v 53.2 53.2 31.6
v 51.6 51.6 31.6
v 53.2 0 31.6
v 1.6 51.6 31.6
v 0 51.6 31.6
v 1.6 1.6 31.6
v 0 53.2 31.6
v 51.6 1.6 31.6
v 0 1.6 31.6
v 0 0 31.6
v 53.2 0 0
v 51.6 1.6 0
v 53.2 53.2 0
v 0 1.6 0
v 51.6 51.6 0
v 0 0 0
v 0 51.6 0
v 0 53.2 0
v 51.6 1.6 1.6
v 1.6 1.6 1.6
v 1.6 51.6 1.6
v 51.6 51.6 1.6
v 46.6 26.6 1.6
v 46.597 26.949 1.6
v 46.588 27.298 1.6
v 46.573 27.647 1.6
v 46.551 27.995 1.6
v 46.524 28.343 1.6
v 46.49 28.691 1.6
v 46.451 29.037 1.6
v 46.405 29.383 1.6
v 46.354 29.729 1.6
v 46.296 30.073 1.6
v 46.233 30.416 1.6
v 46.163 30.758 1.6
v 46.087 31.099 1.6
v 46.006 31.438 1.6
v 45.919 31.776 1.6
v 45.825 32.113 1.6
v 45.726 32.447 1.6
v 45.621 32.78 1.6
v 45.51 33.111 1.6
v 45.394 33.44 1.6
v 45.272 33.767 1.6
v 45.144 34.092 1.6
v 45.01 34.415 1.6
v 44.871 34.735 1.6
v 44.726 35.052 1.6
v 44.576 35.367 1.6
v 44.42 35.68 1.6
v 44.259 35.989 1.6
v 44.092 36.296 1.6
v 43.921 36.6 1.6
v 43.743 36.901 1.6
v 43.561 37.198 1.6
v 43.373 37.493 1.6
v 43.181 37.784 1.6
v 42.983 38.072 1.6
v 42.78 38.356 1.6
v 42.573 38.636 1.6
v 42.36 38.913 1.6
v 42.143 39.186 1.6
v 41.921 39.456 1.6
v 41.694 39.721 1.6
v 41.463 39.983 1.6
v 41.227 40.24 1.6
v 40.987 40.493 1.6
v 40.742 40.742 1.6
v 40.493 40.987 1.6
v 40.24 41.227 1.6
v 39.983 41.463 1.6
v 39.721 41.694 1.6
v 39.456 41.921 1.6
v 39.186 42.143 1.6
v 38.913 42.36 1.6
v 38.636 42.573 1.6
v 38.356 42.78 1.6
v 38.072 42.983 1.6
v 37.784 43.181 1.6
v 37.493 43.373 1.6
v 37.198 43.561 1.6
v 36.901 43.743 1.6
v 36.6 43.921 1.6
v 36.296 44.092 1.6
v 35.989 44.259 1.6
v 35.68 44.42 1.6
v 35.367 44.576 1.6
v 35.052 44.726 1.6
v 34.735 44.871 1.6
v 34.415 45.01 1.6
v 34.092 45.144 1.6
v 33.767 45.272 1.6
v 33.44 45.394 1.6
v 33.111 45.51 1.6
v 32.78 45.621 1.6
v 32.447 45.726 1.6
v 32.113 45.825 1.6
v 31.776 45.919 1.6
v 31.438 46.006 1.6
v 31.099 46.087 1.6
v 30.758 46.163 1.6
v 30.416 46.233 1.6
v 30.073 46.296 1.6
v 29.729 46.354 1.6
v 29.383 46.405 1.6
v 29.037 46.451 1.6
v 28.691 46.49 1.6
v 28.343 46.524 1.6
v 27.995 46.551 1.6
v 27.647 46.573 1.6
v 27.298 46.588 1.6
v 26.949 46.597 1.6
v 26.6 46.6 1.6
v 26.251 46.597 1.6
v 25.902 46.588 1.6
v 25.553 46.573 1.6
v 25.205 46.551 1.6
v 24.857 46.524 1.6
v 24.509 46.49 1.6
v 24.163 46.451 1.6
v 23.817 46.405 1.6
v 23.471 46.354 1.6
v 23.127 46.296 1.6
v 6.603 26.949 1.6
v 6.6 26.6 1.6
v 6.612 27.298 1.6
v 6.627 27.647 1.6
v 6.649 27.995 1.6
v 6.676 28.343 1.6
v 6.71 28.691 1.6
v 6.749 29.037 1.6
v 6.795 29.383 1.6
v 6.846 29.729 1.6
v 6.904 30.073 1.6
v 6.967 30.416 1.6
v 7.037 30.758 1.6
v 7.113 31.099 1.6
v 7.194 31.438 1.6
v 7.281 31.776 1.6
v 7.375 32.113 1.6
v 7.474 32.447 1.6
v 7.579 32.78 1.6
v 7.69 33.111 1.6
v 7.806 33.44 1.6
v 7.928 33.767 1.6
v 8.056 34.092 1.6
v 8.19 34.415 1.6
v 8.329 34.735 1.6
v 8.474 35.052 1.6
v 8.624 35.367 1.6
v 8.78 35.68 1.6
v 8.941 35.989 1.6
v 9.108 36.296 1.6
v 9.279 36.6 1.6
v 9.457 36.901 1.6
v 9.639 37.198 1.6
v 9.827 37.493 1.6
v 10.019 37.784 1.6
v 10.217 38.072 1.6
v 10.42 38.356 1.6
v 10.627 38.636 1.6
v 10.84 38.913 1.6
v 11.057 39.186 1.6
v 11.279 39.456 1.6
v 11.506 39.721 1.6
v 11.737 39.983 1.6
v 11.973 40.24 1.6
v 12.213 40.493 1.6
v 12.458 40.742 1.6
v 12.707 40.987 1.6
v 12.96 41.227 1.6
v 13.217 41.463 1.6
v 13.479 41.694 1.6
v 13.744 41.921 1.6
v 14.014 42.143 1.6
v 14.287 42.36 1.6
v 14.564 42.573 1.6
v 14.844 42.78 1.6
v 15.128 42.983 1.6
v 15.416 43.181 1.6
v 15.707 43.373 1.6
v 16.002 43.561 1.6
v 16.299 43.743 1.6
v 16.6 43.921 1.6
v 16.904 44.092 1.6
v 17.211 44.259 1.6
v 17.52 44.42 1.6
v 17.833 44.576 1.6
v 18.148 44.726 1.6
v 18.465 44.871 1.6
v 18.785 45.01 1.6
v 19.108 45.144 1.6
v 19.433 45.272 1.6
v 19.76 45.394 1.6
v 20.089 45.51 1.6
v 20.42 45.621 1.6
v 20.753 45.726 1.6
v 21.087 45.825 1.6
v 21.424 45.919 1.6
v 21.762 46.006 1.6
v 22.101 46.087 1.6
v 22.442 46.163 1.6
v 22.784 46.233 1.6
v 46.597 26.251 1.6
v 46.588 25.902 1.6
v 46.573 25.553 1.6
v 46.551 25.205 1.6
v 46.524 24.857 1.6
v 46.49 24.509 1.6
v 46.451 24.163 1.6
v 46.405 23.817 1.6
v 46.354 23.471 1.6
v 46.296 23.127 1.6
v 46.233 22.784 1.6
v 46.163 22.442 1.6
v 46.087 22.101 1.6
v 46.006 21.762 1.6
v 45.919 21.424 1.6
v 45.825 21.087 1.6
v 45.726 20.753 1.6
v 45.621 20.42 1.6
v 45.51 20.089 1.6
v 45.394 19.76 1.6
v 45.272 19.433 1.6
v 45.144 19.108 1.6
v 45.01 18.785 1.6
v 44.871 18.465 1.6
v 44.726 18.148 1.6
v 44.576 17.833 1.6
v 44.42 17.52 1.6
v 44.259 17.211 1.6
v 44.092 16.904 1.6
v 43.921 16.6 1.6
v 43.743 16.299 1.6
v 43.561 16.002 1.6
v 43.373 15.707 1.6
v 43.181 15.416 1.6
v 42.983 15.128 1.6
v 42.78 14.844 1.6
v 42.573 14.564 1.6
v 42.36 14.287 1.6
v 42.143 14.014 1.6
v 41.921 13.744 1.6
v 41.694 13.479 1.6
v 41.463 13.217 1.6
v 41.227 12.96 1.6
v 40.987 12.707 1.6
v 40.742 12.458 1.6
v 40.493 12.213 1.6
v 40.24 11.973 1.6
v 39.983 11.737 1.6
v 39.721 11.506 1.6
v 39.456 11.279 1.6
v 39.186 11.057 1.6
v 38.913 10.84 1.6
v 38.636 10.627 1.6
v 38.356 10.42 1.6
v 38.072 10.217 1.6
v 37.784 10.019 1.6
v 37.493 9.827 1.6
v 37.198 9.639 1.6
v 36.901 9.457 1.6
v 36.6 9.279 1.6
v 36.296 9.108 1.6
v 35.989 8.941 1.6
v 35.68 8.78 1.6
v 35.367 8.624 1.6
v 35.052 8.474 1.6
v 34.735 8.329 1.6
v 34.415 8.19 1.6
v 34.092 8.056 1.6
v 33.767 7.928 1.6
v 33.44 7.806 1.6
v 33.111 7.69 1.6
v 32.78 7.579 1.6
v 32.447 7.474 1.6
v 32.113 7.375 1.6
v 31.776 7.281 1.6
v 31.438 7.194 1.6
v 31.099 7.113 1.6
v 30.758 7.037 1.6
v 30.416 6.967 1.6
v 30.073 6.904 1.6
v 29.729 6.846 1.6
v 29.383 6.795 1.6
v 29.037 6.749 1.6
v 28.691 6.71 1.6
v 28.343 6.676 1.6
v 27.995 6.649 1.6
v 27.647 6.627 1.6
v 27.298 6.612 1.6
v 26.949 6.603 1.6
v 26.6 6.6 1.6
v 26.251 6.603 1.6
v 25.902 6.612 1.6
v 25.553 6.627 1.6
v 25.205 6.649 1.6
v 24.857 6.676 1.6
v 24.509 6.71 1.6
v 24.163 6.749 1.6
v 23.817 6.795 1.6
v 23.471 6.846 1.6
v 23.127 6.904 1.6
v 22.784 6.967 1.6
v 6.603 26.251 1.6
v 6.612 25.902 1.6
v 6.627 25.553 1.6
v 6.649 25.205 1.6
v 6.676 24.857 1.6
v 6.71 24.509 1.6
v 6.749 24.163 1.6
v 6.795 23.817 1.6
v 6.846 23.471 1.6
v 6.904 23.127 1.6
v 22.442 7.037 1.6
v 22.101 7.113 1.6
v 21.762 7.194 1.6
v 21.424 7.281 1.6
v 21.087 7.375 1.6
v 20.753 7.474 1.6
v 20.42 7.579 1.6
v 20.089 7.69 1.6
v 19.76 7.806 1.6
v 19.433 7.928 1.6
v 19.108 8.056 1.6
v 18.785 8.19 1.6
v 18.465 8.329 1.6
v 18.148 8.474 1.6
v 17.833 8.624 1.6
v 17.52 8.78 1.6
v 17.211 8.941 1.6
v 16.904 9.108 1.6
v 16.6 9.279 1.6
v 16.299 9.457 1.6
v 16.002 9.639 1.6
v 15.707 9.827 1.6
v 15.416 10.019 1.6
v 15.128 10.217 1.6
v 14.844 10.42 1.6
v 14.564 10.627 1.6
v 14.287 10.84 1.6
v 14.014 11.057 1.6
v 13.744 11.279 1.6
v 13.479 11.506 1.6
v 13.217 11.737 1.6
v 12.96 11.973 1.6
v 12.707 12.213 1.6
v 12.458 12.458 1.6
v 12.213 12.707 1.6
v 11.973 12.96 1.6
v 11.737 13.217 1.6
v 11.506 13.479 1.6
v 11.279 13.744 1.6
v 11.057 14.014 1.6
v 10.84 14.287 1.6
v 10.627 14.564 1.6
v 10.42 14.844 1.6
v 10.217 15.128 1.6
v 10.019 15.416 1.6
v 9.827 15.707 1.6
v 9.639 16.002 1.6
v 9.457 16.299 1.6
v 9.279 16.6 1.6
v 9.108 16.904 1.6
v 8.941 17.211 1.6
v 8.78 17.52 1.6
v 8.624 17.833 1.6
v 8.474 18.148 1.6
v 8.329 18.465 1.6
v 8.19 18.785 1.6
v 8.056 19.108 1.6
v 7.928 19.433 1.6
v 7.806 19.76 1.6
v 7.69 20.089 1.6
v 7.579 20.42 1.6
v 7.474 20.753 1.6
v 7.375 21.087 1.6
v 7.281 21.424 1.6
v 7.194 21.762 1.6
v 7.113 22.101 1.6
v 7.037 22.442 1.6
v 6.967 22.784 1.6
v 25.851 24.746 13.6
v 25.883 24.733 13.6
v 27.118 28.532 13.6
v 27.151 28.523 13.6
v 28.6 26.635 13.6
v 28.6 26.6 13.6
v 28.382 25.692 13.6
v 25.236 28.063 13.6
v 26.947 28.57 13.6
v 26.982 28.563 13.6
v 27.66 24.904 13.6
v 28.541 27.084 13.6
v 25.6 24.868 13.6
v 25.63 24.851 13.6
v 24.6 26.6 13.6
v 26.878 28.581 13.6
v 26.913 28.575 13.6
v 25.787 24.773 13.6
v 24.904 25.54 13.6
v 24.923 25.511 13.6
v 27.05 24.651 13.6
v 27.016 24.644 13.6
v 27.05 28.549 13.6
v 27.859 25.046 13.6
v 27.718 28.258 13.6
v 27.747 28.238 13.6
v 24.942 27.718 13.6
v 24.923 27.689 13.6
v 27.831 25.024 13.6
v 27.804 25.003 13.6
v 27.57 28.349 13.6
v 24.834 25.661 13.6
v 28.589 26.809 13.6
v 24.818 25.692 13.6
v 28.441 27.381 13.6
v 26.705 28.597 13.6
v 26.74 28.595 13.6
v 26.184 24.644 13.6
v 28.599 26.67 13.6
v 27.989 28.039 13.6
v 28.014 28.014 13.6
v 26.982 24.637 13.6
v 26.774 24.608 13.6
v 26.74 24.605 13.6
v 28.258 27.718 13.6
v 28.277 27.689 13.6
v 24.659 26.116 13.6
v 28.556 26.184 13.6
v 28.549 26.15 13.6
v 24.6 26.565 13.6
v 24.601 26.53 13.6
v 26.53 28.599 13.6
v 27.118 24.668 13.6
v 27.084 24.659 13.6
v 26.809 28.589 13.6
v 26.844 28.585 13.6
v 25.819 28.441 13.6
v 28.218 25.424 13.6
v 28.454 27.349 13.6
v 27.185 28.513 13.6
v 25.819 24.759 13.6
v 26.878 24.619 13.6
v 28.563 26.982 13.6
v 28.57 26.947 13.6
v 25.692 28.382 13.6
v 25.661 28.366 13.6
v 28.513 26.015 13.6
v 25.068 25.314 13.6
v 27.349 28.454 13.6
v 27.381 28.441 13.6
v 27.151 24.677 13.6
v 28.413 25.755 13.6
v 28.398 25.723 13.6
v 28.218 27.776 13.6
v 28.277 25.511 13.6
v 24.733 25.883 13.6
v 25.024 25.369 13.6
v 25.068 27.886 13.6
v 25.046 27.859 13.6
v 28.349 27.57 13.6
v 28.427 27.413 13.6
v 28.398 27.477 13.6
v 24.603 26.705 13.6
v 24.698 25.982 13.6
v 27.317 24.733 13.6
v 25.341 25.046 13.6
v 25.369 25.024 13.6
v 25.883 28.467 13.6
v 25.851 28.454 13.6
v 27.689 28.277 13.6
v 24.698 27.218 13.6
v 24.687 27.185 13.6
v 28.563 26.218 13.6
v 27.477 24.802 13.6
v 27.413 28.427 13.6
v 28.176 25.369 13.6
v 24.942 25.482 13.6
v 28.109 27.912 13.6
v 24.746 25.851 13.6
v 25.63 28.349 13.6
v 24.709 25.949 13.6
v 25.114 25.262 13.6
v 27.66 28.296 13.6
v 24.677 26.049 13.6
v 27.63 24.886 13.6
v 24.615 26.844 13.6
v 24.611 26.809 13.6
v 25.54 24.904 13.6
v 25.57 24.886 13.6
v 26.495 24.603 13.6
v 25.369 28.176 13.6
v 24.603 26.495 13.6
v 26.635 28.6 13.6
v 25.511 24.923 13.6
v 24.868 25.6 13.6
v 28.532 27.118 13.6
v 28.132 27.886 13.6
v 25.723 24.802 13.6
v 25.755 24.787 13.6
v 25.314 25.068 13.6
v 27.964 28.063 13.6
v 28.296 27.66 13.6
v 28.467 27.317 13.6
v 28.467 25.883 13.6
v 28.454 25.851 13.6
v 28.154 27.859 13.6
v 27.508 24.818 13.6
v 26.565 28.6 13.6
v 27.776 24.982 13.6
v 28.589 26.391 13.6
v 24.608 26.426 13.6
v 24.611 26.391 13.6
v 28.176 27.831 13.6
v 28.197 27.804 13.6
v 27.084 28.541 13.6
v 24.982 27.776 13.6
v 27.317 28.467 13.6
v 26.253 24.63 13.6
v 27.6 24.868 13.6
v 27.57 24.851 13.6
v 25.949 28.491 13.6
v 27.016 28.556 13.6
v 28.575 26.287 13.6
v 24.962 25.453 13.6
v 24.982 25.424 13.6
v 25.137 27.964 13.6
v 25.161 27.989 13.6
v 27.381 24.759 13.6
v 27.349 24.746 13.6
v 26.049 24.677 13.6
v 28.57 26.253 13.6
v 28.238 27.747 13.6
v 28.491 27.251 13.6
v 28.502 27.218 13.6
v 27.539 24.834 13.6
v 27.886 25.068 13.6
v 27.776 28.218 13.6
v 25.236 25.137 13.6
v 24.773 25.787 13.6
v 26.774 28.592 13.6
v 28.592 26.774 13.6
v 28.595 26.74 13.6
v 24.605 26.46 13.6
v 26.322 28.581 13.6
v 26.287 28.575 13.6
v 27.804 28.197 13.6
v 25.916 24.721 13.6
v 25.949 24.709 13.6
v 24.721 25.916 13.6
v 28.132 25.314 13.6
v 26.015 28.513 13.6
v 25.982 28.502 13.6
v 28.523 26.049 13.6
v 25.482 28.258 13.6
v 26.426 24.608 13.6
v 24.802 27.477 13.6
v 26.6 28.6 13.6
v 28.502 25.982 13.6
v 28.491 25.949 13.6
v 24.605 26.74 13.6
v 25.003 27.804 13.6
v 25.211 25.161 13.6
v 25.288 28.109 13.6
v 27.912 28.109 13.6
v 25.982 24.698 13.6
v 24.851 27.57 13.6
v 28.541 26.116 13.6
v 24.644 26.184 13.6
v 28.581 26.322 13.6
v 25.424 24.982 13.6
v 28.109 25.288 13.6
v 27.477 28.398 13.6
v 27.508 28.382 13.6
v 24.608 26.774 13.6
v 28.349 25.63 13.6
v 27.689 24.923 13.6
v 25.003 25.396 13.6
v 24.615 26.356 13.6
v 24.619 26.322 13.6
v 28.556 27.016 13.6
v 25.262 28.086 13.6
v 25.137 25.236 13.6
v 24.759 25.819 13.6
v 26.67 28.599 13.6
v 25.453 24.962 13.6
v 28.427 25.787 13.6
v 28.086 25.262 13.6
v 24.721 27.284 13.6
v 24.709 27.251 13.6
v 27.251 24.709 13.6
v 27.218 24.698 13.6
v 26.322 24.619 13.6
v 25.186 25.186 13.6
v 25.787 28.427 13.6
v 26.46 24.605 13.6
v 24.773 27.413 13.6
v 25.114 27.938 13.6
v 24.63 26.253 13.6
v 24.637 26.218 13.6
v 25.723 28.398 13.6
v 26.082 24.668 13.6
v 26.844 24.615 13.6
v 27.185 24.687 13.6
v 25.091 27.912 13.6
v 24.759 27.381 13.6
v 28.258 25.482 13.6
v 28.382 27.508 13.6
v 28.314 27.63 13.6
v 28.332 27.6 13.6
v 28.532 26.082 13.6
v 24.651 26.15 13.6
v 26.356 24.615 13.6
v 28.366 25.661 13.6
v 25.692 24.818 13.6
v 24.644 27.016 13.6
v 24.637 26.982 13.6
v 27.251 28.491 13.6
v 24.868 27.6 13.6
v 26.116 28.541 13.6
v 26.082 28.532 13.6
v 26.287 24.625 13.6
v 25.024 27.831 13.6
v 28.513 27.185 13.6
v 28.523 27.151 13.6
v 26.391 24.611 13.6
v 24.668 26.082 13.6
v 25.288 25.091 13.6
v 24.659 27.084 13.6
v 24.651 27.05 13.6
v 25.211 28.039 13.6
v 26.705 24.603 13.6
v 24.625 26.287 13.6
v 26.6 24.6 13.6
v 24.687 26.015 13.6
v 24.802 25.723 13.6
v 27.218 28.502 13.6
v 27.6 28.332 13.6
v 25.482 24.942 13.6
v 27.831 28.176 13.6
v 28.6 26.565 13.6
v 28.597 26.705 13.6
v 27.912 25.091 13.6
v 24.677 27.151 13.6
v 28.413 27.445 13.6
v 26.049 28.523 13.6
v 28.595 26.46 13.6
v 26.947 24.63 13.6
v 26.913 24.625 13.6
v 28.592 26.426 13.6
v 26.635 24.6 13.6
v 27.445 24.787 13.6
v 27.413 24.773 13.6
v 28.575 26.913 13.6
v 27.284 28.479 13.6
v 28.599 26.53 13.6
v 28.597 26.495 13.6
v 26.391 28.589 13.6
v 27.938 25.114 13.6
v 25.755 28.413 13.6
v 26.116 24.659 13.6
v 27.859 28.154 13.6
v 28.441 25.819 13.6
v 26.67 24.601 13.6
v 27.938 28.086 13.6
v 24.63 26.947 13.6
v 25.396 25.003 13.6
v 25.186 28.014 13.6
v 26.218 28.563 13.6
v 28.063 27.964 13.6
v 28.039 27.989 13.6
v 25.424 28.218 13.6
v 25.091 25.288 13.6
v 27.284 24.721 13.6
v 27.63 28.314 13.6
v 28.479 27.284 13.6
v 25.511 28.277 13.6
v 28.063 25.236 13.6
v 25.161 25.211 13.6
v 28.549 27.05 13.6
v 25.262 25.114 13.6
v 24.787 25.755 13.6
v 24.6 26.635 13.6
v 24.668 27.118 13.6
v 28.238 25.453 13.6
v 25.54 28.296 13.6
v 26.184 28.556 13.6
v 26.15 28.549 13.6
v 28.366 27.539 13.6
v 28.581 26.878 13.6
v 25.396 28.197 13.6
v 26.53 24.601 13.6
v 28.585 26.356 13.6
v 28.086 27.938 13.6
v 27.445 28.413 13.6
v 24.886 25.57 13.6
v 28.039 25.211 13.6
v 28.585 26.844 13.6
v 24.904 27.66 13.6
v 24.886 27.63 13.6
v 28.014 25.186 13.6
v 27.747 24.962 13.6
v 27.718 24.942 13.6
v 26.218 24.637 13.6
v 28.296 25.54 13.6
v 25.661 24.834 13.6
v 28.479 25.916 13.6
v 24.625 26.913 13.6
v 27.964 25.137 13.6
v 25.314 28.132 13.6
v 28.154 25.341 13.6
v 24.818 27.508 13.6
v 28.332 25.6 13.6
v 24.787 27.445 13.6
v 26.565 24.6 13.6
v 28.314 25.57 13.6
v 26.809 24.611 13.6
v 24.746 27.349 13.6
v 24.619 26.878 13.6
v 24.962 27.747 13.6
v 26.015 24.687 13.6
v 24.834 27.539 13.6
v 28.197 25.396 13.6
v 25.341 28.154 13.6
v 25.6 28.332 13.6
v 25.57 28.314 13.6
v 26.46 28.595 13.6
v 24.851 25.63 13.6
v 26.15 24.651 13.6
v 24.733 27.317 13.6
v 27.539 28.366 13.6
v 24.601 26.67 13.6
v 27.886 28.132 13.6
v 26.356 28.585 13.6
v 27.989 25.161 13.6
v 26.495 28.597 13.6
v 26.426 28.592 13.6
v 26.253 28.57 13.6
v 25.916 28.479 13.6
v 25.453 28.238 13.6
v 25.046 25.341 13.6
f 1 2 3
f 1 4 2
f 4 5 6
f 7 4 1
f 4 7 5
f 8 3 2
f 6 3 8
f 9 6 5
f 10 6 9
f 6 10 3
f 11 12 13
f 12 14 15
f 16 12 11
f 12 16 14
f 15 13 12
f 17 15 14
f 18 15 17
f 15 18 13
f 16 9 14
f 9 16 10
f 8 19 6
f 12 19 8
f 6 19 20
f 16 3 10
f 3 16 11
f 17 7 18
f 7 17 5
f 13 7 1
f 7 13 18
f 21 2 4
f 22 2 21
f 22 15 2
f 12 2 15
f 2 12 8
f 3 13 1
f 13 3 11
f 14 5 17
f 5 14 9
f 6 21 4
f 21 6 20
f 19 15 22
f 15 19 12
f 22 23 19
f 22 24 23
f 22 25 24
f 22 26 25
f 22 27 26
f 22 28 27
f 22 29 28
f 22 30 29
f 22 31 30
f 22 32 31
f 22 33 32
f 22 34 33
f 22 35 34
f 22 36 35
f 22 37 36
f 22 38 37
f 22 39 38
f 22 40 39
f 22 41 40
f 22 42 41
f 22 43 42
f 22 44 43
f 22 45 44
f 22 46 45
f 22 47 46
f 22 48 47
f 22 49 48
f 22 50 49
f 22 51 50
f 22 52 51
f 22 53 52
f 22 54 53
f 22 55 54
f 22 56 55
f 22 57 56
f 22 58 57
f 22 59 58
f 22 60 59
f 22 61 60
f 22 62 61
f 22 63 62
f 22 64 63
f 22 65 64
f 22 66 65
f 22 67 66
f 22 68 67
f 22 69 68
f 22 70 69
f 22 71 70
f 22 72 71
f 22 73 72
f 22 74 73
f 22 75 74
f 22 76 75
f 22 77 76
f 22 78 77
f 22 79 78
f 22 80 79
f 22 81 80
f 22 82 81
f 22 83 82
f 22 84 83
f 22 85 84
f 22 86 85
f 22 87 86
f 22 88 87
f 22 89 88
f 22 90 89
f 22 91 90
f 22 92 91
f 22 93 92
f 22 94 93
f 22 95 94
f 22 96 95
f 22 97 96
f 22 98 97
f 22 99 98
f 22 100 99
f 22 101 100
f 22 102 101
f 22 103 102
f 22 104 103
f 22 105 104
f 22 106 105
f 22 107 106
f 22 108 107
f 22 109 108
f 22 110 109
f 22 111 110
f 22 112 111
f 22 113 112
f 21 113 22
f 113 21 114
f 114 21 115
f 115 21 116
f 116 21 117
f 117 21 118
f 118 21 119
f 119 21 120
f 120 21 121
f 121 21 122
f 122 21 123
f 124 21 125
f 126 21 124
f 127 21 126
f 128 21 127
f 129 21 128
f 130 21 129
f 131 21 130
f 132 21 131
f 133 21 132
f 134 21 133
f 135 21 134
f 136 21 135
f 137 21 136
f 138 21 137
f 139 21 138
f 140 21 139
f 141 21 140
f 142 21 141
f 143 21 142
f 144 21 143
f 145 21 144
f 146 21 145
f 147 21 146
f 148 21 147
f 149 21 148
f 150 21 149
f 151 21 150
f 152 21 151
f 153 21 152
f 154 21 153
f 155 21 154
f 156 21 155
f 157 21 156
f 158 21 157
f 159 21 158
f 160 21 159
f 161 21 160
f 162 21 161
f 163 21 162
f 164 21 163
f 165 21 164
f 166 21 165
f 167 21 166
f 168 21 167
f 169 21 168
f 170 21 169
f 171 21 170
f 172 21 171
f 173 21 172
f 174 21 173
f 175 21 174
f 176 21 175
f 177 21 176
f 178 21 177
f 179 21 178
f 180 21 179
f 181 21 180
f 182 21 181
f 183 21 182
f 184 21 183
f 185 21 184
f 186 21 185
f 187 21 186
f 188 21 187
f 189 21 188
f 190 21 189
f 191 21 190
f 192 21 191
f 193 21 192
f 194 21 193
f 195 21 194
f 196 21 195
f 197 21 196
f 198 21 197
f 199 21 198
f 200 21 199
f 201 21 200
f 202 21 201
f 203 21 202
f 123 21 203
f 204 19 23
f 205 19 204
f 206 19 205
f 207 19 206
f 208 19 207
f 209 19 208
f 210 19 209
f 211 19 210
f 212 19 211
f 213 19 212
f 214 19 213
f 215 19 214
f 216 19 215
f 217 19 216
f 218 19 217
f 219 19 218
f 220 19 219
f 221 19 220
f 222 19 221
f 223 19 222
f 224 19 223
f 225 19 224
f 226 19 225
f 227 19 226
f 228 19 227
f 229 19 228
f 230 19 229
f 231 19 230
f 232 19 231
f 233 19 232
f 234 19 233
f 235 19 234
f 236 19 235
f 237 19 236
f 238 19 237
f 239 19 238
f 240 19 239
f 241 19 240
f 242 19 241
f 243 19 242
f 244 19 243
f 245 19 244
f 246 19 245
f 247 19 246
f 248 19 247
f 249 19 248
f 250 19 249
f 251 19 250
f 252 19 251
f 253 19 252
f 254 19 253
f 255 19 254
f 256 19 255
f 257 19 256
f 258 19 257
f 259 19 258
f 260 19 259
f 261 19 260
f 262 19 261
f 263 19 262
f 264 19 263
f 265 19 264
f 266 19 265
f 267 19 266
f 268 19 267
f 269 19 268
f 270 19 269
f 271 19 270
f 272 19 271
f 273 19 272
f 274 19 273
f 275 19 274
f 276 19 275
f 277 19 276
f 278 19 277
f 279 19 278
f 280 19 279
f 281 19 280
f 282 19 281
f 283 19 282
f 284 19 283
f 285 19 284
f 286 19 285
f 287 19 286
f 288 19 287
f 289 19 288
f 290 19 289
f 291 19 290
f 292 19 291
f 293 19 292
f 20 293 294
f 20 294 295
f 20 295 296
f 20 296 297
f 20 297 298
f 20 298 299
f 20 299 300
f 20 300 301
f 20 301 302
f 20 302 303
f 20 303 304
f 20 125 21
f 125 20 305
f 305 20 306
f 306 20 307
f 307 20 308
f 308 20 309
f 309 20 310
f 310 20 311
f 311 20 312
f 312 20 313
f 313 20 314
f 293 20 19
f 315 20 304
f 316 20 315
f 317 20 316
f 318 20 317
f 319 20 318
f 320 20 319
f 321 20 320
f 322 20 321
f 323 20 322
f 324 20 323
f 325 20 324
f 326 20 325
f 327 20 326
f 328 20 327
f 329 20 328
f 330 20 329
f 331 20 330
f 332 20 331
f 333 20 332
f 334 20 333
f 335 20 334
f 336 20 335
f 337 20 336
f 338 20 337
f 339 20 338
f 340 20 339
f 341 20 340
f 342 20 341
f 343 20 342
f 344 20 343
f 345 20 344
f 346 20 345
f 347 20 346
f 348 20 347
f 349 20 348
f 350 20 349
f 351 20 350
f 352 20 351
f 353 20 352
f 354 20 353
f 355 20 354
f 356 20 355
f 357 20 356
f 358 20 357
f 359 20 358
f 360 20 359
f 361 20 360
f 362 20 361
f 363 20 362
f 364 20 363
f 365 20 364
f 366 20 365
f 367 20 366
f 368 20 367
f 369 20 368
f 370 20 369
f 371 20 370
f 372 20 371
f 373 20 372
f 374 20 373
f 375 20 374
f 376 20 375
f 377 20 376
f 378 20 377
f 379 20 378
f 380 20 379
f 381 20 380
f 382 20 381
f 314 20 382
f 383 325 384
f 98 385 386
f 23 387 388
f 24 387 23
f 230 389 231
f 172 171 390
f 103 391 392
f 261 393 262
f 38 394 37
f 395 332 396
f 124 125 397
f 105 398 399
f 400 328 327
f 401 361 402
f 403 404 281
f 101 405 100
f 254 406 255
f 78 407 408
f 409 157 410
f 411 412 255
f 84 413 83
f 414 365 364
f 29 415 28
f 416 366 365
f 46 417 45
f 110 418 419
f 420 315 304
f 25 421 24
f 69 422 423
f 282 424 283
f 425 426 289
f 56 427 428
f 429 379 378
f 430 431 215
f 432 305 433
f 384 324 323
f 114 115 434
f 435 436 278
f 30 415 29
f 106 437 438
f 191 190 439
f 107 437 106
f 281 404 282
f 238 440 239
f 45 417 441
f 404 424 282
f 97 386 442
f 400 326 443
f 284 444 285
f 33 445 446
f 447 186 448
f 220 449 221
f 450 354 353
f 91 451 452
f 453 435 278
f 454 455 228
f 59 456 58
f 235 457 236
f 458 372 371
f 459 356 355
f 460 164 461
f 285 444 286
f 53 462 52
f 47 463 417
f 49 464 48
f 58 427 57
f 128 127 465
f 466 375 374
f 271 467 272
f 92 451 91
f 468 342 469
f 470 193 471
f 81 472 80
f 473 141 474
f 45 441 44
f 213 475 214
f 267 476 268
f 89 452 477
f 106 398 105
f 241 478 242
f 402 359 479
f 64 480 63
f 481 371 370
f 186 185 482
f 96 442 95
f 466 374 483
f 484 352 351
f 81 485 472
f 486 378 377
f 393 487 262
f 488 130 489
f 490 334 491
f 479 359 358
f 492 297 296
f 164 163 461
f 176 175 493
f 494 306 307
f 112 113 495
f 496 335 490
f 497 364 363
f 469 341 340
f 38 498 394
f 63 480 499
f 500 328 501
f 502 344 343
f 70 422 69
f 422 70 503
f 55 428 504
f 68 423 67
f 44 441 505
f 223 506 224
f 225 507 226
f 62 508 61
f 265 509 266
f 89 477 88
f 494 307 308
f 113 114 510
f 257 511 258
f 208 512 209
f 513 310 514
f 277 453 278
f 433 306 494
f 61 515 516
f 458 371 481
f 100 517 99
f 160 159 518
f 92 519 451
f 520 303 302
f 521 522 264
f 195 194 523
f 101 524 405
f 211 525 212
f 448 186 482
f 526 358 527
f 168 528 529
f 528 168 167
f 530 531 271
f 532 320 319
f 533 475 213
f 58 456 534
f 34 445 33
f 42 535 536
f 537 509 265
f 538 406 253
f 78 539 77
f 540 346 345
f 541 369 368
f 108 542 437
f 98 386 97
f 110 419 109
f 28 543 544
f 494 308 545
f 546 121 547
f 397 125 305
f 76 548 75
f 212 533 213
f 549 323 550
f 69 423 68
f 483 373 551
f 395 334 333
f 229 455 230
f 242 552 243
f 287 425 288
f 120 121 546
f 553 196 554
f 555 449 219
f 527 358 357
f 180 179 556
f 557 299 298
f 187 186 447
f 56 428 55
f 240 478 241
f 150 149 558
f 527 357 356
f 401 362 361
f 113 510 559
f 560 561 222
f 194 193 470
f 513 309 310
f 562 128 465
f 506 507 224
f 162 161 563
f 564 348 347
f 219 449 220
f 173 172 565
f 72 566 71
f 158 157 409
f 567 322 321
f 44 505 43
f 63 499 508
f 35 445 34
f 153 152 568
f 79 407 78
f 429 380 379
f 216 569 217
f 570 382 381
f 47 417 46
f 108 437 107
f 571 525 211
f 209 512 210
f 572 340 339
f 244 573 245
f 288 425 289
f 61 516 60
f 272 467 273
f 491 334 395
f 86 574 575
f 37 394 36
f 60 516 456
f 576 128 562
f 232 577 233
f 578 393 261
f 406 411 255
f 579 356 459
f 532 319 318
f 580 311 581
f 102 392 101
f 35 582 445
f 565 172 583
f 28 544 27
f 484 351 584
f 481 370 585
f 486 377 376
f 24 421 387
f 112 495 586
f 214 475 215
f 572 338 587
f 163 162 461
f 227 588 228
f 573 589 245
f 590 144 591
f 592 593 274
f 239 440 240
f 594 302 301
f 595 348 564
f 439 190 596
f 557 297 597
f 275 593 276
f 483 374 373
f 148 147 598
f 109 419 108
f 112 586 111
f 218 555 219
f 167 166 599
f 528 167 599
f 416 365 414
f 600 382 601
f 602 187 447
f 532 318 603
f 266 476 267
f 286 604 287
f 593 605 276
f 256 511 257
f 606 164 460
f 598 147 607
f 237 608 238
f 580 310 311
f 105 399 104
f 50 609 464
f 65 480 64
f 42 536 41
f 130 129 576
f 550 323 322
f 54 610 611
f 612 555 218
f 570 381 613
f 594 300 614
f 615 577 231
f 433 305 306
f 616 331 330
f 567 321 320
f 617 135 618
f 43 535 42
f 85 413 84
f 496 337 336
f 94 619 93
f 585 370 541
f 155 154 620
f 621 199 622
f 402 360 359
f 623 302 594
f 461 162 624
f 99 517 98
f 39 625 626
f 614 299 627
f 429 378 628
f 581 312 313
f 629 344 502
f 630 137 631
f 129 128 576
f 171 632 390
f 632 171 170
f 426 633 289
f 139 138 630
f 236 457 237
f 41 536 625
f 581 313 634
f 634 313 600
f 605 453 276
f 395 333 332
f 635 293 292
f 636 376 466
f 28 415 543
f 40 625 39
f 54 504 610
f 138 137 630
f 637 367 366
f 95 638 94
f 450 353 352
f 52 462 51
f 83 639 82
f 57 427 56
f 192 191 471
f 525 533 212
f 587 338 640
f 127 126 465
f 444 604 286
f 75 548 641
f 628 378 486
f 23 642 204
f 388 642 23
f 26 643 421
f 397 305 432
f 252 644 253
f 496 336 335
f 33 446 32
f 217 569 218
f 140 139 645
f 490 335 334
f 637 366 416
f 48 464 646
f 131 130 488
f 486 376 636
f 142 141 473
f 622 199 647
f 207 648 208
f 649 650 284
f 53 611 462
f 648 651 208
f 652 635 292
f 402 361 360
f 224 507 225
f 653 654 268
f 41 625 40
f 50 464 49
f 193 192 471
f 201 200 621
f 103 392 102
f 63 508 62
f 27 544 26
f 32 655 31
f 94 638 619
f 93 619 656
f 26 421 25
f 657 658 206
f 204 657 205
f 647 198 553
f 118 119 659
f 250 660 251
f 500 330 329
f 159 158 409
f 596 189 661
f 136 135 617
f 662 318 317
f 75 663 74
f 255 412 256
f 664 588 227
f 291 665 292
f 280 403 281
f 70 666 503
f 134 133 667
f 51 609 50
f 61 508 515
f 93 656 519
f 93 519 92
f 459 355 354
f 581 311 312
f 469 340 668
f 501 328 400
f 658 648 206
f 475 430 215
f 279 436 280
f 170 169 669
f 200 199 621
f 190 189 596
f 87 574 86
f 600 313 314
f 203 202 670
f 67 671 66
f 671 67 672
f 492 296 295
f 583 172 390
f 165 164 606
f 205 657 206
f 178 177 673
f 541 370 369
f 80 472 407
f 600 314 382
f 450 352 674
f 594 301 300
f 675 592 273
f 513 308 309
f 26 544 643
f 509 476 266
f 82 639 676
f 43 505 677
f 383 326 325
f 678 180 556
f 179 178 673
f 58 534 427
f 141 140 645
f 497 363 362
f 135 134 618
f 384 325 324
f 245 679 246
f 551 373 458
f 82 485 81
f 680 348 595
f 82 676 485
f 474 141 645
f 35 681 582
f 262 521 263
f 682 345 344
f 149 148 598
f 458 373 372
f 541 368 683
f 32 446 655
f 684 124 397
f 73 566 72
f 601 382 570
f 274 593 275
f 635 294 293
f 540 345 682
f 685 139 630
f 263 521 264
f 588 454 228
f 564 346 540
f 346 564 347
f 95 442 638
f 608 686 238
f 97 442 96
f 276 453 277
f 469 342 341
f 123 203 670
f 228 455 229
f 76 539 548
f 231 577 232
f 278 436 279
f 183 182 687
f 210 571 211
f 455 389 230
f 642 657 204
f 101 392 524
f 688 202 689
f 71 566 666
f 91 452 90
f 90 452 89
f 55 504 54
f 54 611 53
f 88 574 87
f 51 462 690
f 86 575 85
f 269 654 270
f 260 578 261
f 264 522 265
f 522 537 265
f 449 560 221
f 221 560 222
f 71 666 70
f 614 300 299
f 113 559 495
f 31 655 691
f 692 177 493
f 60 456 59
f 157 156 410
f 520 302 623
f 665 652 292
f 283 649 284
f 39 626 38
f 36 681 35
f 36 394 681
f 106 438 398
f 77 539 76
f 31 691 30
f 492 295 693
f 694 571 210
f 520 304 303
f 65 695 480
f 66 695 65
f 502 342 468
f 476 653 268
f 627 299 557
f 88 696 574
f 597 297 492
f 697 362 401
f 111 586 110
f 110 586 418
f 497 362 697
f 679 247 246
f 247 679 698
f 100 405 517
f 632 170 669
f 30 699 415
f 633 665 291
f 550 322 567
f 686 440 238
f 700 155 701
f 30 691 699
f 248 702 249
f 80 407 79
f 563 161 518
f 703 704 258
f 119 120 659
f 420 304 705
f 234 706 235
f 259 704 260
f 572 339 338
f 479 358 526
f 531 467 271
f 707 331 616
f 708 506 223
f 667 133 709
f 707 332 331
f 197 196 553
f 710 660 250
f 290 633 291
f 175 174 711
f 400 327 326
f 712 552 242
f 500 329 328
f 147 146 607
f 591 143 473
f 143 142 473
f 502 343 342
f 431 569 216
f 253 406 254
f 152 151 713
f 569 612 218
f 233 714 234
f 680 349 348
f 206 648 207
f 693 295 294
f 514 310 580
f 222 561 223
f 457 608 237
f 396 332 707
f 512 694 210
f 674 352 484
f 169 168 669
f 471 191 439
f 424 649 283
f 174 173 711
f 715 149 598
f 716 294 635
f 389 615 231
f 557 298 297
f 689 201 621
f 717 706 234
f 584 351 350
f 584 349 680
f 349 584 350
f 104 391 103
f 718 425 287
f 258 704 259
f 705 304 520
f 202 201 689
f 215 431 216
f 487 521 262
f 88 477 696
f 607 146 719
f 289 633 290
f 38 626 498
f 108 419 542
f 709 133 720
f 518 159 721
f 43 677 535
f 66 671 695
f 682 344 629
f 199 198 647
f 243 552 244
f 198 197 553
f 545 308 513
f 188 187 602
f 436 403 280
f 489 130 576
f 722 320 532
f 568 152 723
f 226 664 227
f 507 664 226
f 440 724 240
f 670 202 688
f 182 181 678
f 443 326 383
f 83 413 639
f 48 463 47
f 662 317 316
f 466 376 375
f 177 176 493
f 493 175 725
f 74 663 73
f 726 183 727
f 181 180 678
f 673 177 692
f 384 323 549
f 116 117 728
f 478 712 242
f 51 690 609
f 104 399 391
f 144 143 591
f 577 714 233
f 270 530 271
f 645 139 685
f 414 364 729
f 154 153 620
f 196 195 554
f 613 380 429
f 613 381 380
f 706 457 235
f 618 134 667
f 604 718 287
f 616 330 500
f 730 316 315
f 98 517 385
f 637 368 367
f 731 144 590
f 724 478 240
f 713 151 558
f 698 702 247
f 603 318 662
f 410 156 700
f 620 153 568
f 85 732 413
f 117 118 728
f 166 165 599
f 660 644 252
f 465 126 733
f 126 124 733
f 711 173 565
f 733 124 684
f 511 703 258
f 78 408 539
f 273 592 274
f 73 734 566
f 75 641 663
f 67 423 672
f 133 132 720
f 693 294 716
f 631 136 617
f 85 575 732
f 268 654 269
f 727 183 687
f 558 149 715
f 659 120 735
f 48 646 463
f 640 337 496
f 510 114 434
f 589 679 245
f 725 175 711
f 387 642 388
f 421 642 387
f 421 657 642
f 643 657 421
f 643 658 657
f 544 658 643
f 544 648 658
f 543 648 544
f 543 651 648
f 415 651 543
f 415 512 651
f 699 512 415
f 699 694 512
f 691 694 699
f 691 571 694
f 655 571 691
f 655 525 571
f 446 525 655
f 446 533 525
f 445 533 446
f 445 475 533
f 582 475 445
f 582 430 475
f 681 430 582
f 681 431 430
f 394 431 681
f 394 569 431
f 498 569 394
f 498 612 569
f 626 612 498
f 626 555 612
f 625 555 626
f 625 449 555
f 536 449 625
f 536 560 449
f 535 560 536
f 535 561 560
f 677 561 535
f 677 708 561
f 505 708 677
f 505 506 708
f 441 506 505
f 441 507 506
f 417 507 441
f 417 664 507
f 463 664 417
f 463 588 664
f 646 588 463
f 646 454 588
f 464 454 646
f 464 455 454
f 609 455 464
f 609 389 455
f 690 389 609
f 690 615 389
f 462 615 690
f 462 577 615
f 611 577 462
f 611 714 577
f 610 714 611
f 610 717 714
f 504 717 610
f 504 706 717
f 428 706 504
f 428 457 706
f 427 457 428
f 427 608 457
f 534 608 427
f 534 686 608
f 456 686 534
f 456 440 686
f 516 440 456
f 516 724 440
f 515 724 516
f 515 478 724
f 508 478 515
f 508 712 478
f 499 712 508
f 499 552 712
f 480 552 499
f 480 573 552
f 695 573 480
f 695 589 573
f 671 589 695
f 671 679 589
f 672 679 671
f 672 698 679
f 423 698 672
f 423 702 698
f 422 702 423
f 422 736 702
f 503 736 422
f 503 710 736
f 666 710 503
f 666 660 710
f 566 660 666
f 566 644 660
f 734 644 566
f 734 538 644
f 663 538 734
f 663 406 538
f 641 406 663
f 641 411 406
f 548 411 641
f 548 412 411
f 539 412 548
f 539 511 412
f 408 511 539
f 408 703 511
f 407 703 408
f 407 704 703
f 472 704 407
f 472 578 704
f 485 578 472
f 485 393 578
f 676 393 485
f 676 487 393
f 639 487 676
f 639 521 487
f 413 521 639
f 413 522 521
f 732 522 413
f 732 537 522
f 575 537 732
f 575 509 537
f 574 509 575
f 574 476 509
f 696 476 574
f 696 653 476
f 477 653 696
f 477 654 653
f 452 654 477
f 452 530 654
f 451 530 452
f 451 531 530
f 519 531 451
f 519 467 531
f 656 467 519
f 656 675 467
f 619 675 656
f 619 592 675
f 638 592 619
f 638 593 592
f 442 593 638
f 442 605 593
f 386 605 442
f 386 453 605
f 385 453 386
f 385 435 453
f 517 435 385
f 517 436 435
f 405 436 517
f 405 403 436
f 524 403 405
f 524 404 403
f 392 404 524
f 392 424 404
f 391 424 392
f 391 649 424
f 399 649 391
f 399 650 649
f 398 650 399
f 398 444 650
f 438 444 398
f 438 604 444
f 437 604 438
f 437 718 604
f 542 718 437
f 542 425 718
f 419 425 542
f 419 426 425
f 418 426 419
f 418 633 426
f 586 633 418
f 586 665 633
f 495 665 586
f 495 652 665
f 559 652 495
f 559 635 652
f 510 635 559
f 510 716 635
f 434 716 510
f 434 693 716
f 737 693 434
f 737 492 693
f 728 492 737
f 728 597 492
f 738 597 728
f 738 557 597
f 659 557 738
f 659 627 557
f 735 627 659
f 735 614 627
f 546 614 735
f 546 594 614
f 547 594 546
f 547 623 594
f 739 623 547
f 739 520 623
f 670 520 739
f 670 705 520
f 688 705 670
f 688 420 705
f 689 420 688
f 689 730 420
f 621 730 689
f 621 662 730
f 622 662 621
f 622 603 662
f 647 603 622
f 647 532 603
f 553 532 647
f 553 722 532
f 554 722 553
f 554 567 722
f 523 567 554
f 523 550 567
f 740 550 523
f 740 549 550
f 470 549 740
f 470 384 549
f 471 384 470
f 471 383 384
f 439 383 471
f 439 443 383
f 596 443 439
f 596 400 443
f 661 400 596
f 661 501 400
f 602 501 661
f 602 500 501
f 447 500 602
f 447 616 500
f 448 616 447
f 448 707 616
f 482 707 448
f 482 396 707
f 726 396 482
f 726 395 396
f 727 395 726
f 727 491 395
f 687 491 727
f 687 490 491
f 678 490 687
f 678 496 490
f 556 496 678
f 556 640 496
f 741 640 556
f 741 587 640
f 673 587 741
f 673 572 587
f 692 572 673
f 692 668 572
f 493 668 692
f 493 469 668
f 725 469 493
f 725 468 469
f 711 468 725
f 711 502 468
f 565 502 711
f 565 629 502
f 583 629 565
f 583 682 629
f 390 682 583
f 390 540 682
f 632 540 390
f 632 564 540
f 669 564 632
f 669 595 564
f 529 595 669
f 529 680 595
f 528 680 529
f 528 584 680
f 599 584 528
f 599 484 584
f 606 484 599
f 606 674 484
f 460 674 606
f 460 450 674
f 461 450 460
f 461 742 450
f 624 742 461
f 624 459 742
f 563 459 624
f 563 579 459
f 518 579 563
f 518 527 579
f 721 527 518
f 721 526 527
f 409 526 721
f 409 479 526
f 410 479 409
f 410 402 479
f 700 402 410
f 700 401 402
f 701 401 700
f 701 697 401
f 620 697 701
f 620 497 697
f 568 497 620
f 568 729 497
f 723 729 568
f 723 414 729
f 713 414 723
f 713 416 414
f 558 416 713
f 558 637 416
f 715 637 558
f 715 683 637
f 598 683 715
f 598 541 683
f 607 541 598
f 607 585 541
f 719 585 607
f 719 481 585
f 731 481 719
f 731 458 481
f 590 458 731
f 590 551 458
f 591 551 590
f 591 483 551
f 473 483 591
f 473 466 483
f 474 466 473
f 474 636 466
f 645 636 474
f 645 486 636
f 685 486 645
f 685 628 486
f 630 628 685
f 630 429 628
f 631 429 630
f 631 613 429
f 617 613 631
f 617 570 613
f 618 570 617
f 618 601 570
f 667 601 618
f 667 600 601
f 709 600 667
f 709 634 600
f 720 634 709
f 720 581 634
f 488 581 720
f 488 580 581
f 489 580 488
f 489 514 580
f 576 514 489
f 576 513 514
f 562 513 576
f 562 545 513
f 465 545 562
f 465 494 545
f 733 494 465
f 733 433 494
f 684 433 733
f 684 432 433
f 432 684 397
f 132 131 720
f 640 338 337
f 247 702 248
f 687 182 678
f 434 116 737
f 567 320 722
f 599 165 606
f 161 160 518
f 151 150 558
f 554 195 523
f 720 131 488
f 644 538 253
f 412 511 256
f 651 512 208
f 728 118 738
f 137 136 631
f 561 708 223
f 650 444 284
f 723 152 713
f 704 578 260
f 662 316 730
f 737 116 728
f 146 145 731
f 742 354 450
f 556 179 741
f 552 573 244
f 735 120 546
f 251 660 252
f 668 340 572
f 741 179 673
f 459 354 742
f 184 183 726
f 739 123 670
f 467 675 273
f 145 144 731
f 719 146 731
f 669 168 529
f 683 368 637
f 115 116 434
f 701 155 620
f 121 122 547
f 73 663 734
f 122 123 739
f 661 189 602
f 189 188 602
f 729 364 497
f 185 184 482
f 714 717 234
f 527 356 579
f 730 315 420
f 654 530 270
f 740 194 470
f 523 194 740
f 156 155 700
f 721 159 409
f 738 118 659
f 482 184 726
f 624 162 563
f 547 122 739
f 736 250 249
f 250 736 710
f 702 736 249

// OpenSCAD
form(50, 30, 1.6, 12);

module form(width, height, wallwidth, funnelheight) {
    translate([wallwidth, wallwidth, 0]) {
      cube([width, width, wallwidth], false);
    }
    module wall() {
        cube([width + wallwidth * 2, wallwidth, height + wallwidth]);
    }

    module walls() {
        wall();

        translate([0,width + wallwidth,0]) {
            wall();
        }
    }

    walls();
    translate([(width + wallwidth * 2), 0, 0]) {
        rotate([0, 0, 90]) {    
            walls();
        }
    }

    module funnel() {
     cylinder($fn=360, funnelheight, width / 2 - ((width * 10) / 100), 2, false);
    }

    translate([width / 2 + wallwidth, width / 2 + wallwidth, wallwidth]) {
        funnel();
    }
}
